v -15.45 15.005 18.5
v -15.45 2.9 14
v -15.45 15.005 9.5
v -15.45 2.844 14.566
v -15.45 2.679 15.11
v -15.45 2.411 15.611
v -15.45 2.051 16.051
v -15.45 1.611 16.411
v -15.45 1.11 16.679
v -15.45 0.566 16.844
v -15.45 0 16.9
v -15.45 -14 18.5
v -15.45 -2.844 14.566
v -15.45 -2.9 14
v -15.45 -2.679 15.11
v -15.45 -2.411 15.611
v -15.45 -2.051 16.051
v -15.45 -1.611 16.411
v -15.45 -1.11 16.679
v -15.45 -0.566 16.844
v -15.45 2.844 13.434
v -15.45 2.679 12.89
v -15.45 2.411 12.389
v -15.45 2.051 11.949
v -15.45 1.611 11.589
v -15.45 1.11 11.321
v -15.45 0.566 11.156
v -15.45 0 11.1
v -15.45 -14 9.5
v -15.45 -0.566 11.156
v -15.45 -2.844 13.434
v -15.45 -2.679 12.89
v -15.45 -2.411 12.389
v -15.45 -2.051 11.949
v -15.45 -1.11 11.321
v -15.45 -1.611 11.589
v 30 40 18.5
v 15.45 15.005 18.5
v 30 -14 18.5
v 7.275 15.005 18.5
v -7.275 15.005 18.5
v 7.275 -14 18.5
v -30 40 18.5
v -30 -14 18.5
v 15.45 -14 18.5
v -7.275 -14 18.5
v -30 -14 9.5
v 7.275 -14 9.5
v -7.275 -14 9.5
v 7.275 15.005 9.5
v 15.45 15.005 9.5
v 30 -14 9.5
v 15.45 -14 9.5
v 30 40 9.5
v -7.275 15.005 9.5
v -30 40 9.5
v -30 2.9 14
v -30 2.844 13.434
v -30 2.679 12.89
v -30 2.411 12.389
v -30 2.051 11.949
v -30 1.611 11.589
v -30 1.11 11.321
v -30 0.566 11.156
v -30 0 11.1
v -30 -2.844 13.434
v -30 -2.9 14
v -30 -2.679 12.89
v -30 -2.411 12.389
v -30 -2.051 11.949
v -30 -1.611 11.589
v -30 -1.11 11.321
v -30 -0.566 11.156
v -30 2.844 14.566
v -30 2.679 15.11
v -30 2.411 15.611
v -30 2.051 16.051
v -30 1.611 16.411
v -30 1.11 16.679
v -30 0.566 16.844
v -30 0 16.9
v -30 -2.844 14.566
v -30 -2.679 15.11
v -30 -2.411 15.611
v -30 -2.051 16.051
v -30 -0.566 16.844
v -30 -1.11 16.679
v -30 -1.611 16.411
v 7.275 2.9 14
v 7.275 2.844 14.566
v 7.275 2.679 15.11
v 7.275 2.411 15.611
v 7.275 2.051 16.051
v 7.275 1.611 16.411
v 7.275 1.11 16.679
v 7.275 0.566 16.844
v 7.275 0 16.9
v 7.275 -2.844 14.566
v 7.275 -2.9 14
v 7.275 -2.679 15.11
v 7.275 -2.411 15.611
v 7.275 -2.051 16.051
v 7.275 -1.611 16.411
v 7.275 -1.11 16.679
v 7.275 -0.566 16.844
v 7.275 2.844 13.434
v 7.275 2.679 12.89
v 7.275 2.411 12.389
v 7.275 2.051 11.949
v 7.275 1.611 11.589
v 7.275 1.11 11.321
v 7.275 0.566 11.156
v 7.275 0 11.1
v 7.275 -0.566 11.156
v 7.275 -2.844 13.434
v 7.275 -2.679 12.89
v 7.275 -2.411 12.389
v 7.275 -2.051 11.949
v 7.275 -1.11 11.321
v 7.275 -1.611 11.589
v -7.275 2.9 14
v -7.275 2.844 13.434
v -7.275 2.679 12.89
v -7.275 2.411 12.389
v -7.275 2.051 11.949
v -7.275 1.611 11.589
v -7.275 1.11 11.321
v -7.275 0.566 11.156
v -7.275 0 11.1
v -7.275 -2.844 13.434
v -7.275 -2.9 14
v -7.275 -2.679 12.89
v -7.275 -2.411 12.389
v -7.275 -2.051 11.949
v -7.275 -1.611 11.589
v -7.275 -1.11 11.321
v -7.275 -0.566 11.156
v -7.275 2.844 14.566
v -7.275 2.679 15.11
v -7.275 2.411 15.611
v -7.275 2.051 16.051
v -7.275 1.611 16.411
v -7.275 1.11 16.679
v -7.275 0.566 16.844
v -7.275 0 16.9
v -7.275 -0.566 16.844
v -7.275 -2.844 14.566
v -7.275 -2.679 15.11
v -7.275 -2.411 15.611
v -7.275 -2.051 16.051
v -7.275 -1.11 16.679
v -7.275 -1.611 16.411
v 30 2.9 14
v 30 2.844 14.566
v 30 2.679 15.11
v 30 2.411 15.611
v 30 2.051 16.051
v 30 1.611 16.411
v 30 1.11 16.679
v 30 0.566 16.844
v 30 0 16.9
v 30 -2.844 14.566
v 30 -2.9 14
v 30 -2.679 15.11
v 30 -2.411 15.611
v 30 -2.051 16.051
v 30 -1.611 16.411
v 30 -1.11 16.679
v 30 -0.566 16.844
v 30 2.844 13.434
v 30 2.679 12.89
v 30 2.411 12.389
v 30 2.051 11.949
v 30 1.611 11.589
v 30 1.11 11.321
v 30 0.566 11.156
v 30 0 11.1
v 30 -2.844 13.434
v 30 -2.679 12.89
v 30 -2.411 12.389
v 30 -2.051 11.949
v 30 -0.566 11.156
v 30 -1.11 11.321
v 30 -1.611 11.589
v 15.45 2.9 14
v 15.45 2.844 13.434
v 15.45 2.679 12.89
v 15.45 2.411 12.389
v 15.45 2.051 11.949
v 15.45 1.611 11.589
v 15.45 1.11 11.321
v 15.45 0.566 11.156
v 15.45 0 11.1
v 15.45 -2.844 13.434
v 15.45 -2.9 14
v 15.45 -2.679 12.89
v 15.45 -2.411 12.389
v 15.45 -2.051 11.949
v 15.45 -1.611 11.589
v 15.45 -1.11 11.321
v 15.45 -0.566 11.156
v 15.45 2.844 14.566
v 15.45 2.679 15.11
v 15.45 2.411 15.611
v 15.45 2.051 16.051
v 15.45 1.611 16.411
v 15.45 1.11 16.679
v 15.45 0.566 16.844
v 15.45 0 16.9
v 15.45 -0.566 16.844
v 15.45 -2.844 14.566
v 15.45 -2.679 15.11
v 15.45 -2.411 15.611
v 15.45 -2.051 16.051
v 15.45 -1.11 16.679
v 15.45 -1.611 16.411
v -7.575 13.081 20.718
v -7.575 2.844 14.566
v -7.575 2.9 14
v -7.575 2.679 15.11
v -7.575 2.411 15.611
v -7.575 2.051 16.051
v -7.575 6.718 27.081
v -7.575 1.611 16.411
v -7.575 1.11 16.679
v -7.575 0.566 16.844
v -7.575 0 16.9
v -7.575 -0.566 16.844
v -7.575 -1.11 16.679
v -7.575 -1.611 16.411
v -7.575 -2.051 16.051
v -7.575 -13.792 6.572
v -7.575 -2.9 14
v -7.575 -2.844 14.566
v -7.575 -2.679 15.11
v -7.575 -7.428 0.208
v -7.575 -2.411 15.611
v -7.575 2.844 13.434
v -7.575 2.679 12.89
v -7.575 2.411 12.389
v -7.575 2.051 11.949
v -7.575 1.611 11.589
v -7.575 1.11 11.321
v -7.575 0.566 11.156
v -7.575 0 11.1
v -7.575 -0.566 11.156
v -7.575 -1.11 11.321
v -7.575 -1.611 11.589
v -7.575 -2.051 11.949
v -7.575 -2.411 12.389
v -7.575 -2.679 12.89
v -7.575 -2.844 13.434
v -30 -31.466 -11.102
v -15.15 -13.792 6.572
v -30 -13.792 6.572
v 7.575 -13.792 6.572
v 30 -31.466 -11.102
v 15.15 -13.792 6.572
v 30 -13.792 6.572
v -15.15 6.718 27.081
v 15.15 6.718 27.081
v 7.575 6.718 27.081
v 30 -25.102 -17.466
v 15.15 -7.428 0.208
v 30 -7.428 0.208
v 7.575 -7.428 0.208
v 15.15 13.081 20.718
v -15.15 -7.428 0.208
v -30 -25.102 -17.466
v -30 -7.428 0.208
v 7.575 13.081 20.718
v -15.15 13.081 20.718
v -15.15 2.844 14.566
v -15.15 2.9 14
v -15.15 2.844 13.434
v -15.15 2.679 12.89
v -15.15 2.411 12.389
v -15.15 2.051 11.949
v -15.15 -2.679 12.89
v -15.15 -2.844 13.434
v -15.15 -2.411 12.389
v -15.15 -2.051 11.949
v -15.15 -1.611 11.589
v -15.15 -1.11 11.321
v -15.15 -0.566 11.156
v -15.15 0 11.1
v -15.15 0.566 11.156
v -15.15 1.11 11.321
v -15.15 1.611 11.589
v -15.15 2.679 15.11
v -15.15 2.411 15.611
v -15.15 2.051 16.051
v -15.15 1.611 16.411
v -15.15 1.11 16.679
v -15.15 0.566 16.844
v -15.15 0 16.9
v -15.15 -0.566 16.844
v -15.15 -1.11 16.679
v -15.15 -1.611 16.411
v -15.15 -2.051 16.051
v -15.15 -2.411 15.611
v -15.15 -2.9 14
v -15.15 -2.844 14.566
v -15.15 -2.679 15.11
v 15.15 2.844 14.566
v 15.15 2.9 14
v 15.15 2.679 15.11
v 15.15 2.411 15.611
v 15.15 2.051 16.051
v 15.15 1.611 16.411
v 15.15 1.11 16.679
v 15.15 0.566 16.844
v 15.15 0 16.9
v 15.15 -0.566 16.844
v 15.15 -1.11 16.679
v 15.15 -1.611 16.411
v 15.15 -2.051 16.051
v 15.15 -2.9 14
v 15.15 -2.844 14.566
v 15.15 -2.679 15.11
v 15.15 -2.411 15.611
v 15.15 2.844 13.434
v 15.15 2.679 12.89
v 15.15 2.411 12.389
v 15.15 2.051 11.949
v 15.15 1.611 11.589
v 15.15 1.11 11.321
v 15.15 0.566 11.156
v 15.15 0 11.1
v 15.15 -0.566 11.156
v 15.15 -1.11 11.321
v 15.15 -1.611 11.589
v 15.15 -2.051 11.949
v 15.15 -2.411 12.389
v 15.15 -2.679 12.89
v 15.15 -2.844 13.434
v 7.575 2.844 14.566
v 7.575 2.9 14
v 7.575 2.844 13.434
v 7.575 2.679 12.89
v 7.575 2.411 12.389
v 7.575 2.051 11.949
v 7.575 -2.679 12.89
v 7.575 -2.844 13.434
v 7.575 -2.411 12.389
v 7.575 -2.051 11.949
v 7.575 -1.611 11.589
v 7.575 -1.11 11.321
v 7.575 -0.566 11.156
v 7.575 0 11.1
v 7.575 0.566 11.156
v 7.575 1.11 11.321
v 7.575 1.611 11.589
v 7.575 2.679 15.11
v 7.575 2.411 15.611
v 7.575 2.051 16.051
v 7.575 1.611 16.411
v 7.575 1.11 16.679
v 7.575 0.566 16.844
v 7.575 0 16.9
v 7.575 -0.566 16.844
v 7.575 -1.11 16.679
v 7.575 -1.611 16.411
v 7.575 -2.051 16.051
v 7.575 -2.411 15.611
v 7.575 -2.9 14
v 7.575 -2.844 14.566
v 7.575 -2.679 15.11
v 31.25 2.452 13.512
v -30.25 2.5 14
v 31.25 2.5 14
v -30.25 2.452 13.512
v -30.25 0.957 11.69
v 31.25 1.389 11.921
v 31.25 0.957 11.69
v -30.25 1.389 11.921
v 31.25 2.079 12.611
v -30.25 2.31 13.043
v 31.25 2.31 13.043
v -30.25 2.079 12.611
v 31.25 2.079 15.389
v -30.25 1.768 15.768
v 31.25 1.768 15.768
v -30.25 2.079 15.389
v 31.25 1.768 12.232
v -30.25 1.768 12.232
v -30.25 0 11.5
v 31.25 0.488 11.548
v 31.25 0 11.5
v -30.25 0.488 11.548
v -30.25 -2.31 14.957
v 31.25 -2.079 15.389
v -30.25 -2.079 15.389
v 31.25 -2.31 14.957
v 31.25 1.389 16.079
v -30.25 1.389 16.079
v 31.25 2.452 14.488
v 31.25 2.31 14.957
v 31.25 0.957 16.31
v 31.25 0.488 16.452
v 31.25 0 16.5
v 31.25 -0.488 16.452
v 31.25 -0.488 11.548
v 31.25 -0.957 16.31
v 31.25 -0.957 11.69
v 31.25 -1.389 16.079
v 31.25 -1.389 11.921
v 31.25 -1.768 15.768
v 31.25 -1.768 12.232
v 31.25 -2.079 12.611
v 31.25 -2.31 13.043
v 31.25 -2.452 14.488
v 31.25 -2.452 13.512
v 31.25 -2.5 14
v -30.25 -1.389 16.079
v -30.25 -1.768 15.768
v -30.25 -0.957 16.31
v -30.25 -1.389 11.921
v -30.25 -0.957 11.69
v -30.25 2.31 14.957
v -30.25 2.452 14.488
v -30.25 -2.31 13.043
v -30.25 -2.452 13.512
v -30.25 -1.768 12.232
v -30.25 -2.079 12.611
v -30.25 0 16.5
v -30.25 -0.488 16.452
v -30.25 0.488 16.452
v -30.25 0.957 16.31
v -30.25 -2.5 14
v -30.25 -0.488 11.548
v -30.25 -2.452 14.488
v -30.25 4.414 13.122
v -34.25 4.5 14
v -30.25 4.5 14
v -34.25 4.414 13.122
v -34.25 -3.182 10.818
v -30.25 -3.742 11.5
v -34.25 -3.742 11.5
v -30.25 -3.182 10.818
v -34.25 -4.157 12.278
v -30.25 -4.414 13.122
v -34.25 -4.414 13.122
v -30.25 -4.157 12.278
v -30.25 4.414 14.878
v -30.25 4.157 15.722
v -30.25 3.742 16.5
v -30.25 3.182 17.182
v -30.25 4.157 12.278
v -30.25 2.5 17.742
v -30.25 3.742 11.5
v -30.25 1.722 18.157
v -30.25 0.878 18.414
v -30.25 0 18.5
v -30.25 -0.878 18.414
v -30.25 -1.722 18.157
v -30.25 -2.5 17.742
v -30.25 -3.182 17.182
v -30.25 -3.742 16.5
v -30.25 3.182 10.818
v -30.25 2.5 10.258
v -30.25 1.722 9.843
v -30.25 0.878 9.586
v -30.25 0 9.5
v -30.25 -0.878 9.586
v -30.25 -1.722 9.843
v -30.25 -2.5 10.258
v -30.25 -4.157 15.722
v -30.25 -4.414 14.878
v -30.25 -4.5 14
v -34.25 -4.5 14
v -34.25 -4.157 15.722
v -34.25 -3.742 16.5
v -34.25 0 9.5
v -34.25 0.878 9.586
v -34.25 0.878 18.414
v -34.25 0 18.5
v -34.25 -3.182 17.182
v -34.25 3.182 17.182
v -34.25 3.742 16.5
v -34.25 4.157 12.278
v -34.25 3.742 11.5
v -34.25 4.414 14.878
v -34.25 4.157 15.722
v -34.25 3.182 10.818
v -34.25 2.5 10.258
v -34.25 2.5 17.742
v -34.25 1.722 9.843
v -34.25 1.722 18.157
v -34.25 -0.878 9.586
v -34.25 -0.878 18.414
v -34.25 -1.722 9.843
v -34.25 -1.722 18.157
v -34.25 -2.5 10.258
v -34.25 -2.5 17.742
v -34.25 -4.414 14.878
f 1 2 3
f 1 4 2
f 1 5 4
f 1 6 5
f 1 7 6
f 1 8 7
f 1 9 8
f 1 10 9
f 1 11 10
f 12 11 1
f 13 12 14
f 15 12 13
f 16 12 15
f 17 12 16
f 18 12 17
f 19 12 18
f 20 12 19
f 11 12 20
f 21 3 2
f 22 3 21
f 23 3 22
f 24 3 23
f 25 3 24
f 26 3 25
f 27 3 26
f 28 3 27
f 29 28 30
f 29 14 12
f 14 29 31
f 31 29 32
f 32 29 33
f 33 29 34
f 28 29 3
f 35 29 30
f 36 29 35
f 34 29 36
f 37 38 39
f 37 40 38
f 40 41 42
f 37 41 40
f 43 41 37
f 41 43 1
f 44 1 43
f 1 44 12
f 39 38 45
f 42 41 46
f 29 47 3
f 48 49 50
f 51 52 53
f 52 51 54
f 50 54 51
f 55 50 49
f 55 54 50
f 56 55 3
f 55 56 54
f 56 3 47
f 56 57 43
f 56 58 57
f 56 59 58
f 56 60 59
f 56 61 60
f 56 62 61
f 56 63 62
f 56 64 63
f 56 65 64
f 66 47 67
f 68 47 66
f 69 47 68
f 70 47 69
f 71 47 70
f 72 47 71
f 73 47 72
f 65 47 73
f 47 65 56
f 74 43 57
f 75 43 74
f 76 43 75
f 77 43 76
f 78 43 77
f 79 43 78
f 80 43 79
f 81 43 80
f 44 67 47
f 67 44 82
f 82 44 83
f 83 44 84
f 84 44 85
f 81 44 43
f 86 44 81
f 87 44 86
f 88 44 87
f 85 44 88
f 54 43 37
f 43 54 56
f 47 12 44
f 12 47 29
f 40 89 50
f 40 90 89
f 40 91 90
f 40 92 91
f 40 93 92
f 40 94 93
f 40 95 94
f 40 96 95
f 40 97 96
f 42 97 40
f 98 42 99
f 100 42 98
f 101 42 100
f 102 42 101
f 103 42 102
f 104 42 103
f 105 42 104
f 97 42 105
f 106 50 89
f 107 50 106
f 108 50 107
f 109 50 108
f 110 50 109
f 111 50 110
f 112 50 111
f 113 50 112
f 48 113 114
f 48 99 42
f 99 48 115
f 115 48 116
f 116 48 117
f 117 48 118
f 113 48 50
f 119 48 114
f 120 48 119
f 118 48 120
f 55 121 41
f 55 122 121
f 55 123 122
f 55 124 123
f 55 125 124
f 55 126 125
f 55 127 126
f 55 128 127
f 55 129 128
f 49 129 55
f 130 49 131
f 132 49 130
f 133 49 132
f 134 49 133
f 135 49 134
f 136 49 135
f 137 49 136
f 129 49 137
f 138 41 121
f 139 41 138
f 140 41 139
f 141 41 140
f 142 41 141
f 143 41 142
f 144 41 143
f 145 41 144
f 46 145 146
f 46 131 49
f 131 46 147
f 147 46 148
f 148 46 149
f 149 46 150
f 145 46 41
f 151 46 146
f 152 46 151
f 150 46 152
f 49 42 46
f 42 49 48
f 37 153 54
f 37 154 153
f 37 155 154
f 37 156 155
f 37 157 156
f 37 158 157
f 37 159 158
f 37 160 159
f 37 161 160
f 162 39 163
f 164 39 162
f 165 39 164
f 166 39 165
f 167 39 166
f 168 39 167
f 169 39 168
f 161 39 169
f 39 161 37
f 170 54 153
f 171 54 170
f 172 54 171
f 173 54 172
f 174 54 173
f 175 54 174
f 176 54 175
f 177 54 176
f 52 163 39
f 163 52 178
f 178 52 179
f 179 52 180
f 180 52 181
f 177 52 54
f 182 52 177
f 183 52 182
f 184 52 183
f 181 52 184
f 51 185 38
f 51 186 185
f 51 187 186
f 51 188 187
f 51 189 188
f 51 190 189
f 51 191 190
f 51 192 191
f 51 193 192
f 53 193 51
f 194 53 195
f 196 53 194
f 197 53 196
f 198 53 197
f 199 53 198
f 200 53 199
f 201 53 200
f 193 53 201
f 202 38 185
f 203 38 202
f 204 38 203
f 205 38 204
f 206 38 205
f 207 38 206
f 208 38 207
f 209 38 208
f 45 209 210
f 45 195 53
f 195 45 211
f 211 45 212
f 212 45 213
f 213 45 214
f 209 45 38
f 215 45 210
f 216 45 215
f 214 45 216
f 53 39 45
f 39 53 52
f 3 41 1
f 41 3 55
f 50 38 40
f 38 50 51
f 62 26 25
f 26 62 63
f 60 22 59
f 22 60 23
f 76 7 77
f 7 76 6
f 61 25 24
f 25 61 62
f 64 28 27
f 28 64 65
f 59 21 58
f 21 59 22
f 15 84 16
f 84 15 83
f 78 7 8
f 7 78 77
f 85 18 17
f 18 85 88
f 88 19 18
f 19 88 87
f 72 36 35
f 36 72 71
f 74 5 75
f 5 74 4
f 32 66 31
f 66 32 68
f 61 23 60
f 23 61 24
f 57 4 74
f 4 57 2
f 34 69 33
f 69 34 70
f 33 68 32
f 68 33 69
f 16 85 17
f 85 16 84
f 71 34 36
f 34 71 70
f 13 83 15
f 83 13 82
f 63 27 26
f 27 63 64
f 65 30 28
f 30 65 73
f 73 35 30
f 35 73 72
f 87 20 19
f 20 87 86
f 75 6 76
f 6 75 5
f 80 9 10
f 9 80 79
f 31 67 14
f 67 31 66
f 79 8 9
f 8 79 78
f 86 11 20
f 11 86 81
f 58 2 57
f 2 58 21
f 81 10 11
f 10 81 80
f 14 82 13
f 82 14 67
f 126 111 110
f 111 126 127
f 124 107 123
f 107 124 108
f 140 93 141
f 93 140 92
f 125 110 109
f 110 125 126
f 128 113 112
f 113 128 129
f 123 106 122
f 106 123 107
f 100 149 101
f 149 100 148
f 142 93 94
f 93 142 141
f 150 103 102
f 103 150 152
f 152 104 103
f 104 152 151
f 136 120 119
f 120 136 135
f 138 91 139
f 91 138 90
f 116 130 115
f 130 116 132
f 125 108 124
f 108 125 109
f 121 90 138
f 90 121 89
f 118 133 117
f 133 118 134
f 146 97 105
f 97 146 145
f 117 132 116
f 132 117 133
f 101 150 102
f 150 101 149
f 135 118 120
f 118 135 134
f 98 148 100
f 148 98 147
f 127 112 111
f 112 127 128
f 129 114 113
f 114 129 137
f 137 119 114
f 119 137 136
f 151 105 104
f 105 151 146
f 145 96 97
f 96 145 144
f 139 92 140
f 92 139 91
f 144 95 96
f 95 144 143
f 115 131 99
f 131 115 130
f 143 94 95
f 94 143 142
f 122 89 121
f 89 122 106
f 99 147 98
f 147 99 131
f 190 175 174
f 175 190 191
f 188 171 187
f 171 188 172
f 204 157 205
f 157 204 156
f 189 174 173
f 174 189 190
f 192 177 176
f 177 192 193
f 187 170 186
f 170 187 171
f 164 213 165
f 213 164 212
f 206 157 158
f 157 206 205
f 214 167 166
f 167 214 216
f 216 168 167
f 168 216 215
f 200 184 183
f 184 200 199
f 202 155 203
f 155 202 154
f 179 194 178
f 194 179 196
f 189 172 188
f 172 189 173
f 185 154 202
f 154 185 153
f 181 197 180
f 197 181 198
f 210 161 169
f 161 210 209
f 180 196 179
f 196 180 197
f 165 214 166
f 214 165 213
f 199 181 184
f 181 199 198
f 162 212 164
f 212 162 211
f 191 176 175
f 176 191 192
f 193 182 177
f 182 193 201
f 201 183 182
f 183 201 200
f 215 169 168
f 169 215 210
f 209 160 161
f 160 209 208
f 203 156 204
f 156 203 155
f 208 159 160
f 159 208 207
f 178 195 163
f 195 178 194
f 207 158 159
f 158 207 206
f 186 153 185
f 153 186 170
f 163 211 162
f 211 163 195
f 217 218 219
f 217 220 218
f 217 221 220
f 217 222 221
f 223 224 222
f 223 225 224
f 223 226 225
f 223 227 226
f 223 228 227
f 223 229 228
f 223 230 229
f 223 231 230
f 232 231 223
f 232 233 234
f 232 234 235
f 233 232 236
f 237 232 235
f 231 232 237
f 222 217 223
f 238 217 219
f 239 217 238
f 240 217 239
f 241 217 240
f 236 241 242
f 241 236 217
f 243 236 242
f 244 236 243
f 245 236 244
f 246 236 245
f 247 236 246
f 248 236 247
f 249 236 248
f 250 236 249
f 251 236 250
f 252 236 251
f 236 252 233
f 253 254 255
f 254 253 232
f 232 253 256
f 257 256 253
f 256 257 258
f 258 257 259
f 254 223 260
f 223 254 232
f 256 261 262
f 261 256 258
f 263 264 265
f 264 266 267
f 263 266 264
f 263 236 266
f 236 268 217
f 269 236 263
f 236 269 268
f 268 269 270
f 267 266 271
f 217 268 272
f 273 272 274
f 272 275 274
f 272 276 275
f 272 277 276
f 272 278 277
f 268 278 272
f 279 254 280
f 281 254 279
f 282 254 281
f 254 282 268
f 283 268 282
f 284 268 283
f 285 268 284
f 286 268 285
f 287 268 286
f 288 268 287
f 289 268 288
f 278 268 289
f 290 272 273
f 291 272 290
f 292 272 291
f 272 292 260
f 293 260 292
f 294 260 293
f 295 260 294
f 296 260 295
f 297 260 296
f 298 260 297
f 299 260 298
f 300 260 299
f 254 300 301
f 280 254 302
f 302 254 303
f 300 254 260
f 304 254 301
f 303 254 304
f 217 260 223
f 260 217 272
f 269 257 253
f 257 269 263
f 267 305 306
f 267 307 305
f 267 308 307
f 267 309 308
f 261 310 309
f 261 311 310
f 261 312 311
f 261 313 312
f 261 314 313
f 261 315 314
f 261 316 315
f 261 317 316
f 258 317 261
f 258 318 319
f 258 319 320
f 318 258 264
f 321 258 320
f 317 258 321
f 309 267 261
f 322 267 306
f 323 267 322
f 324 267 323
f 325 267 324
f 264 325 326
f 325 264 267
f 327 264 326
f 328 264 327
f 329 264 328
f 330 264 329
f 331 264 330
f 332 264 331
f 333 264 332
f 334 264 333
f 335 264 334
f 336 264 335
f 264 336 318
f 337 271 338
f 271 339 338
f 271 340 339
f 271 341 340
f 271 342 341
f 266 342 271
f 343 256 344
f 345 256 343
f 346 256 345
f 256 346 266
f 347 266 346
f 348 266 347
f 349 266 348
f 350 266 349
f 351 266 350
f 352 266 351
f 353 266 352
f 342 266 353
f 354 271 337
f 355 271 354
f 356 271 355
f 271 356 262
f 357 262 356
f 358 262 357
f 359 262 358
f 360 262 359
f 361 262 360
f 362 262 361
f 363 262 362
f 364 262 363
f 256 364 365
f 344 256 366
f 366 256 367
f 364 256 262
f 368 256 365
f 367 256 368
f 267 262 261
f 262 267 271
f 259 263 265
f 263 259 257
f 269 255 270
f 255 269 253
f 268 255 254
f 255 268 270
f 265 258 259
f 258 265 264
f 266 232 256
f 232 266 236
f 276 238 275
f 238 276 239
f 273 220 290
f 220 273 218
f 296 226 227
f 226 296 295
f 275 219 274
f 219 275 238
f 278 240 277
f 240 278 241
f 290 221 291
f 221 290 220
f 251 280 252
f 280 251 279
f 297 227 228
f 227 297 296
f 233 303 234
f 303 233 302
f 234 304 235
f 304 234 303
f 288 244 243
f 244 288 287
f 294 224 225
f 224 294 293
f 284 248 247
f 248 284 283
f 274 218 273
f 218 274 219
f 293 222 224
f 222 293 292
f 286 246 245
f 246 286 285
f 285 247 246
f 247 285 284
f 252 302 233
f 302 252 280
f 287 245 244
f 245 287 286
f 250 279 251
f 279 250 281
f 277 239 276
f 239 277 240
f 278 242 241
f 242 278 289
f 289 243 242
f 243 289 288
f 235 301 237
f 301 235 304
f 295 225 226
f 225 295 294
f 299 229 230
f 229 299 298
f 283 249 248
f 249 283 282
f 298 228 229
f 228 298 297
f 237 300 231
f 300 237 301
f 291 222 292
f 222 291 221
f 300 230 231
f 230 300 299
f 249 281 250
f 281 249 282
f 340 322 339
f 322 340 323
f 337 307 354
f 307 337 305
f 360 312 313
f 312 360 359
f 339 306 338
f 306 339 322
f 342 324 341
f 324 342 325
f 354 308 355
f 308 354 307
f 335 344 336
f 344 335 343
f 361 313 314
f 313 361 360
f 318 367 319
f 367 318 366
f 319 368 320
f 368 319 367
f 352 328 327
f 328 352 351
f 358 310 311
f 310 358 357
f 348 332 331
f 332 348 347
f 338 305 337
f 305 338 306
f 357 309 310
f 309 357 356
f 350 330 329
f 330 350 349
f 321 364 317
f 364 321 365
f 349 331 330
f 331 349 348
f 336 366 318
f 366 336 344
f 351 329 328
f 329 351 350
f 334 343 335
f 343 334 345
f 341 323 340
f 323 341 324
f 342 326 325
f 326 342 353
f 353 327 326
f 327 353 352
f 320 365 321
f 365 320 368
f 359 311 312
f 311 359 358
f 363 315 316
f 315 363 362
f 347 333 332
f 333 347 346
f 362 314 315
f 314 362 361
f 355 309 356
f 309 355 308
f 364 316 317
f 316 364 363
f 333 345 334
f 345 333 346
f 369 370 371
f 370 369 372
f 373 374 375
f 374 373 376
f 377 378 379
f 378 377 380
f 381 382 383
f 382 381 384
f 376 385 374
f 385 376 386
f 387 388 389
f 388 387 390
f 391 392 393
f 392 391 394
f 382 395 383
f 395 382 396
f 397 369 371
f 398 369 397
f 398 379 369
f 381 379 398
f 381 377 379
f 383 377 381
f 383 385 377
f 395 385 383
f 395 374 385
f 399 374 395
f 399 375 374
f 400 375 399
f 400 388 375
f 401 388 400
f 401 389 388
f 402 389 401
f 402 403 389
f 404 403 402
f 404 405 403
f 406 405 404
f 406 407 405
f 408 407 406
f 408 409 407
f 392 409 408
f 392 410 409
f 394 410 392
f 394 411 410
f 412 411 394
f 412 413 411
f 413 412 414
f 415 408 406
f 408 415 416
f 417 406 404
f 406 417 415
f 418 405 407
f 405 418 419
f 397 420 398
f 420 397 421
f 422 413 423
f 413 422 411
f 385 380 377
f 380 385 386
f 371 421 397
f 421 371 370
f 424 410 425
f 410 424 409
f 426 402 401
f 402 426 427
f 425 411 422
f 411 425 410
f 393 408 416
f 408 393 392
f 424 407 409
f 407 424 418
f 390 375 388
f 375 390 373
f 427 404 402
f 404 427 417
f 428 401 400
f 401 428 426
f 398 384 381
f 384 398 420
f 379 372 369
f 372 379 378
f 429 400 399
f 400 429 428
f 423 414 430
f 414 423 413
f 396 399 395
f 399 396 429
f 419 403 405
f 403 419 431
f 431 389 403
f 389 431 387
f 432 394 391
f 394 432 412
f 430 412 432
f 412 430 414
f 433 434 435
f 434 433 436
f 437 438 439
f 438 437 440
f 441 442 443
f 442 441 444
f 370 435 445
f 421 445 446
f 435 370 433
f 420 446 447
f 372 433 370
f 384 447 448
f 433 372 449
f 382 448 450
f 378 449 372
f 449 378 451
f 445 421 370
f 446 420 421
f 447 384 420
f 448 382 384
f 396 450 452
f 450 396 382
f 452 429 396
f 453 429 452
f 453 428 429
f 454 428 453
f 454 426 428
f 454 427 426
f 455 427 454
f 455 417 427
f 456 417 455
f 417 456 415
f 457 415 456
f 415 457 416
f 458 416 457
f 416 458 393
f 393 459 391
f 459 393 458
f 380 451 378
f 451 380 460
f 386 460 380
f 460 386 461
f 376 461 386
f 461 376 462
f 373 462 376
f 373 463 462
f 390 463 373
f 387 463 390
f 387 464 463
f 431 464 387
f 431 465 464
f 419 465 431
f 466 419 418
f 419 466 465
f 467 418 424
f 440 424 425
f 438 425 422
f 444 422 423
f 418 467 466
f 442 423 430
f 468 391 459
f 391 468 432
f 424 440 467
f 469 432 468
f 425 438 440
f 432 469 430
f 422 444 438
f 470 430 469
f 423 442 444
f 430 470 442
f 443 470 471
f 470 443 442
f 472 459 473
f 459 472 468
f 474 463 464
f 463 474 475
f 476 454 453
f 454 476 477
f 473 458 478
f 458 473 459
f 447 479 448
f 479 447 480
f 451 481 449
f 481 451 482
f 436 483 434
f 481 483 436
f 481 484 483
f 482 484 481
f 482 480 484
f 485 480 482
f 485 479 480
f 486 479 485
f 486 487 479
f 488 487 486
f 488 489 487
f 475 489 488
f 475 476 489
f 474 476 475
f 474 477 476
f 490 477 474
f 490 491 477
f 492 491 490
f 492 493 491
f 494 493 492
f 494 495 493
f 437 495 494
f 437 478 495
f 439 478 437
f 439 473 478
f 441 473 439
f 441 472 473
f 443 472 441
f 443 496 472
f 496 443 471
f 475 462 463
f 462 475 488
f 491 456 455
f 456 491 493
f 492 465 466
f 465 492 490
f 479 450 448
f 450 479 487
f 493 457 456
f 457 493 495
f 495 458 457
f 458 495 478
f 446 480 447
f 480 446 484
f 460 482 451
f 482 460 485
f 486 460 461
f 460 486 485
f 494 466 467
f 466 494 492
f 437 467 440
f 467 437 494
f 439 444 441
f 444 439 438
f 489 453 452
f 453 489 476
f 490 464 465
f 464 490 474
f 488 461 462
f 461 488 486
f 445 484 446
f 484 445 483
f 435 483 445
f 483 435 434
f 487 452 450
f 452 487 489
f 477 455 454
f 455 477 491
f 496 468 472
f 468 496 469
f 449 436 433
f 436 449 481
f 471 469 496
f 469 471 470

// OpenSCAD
$fn = 32;

// ------------------------------------------------------------------------
// Butt hinge: hinge 60 mm, leaf swung 45 deg
// Every part is its own module, assembly() places every instance.
// ------------------------------------------------------------------------

// --- part 1 ---
module hinge_base() {
  difference() {
    union() {
      translate([-30, -14, -4.5]) cube([14.55, 54, 9]);
      translate([-7.275, -14, -4.5]) cube([14.55, 54, 9]);
      translate([15.45, -14, -4.5]) cube([14.55, 54, 9]);
      translate([-30, 15.005, -4.5]) cube([60, 24.995, 9]);
    }
    translate([-22.725, 0, 0]) rotate([0, 90, 0]) cylinder(h = 16.55, d = 5.8, center = true);
    translate([0, 0, 0]) rotate([0, 90, 0]) cylinder(h = 16.55, d = 5.8, center = true);
    translate([22.725, 0, 0]) rotate([0, 90, 0]) cylinder(h = 16.55, d = 5.8, center = true);
  }
}

// --- part 2 ---
module hinge_mover() {
  difference() {
    union() {
      translate([-15.15, -40, -4.5]) cube([7.575, 54, 9]);
      translate([7.575, -40, -4.5]) cube([7.575, 54, 9]);
      translate([-30, -40, -4.5]) cube([60, 24.995, 9]);
    }
    translate([-11.362, 0, 0]) rotate([0, 90, 0]) cylinder(h = 9.575, d = 5.8, center = true);
    translate([11.362, 0, 0]) rotate([0, 90, 0]) cylinder(h = 9.575, d = 5.8, center = true);
  }
}

// --- part 3 ---
module hinge_pin() {
  rotate([0, 90, 0]) cylinder(h = 62.5, d = 5, center = true);
  translate([-34.25, 0, 0]) rotate([0, 90, 0]) cylinder(h = 4, d = 9);
}

// --- assembly ---
module assembly() {
  color([0.80, 0.24, 0.20]) translate([0, 0, 14]) rotate([0, 0, 0]) hinge_base();
  color([0.20, 0.45, 0.75]) translate([0, 0, 14]) rotate([45, 0, 0]) hinge_mover();
  color([0.25, 0.62, 0.32]) translate([0, 0, 14]) rotate([0, 0, 0]) hinge_pin();
}

assembly();
